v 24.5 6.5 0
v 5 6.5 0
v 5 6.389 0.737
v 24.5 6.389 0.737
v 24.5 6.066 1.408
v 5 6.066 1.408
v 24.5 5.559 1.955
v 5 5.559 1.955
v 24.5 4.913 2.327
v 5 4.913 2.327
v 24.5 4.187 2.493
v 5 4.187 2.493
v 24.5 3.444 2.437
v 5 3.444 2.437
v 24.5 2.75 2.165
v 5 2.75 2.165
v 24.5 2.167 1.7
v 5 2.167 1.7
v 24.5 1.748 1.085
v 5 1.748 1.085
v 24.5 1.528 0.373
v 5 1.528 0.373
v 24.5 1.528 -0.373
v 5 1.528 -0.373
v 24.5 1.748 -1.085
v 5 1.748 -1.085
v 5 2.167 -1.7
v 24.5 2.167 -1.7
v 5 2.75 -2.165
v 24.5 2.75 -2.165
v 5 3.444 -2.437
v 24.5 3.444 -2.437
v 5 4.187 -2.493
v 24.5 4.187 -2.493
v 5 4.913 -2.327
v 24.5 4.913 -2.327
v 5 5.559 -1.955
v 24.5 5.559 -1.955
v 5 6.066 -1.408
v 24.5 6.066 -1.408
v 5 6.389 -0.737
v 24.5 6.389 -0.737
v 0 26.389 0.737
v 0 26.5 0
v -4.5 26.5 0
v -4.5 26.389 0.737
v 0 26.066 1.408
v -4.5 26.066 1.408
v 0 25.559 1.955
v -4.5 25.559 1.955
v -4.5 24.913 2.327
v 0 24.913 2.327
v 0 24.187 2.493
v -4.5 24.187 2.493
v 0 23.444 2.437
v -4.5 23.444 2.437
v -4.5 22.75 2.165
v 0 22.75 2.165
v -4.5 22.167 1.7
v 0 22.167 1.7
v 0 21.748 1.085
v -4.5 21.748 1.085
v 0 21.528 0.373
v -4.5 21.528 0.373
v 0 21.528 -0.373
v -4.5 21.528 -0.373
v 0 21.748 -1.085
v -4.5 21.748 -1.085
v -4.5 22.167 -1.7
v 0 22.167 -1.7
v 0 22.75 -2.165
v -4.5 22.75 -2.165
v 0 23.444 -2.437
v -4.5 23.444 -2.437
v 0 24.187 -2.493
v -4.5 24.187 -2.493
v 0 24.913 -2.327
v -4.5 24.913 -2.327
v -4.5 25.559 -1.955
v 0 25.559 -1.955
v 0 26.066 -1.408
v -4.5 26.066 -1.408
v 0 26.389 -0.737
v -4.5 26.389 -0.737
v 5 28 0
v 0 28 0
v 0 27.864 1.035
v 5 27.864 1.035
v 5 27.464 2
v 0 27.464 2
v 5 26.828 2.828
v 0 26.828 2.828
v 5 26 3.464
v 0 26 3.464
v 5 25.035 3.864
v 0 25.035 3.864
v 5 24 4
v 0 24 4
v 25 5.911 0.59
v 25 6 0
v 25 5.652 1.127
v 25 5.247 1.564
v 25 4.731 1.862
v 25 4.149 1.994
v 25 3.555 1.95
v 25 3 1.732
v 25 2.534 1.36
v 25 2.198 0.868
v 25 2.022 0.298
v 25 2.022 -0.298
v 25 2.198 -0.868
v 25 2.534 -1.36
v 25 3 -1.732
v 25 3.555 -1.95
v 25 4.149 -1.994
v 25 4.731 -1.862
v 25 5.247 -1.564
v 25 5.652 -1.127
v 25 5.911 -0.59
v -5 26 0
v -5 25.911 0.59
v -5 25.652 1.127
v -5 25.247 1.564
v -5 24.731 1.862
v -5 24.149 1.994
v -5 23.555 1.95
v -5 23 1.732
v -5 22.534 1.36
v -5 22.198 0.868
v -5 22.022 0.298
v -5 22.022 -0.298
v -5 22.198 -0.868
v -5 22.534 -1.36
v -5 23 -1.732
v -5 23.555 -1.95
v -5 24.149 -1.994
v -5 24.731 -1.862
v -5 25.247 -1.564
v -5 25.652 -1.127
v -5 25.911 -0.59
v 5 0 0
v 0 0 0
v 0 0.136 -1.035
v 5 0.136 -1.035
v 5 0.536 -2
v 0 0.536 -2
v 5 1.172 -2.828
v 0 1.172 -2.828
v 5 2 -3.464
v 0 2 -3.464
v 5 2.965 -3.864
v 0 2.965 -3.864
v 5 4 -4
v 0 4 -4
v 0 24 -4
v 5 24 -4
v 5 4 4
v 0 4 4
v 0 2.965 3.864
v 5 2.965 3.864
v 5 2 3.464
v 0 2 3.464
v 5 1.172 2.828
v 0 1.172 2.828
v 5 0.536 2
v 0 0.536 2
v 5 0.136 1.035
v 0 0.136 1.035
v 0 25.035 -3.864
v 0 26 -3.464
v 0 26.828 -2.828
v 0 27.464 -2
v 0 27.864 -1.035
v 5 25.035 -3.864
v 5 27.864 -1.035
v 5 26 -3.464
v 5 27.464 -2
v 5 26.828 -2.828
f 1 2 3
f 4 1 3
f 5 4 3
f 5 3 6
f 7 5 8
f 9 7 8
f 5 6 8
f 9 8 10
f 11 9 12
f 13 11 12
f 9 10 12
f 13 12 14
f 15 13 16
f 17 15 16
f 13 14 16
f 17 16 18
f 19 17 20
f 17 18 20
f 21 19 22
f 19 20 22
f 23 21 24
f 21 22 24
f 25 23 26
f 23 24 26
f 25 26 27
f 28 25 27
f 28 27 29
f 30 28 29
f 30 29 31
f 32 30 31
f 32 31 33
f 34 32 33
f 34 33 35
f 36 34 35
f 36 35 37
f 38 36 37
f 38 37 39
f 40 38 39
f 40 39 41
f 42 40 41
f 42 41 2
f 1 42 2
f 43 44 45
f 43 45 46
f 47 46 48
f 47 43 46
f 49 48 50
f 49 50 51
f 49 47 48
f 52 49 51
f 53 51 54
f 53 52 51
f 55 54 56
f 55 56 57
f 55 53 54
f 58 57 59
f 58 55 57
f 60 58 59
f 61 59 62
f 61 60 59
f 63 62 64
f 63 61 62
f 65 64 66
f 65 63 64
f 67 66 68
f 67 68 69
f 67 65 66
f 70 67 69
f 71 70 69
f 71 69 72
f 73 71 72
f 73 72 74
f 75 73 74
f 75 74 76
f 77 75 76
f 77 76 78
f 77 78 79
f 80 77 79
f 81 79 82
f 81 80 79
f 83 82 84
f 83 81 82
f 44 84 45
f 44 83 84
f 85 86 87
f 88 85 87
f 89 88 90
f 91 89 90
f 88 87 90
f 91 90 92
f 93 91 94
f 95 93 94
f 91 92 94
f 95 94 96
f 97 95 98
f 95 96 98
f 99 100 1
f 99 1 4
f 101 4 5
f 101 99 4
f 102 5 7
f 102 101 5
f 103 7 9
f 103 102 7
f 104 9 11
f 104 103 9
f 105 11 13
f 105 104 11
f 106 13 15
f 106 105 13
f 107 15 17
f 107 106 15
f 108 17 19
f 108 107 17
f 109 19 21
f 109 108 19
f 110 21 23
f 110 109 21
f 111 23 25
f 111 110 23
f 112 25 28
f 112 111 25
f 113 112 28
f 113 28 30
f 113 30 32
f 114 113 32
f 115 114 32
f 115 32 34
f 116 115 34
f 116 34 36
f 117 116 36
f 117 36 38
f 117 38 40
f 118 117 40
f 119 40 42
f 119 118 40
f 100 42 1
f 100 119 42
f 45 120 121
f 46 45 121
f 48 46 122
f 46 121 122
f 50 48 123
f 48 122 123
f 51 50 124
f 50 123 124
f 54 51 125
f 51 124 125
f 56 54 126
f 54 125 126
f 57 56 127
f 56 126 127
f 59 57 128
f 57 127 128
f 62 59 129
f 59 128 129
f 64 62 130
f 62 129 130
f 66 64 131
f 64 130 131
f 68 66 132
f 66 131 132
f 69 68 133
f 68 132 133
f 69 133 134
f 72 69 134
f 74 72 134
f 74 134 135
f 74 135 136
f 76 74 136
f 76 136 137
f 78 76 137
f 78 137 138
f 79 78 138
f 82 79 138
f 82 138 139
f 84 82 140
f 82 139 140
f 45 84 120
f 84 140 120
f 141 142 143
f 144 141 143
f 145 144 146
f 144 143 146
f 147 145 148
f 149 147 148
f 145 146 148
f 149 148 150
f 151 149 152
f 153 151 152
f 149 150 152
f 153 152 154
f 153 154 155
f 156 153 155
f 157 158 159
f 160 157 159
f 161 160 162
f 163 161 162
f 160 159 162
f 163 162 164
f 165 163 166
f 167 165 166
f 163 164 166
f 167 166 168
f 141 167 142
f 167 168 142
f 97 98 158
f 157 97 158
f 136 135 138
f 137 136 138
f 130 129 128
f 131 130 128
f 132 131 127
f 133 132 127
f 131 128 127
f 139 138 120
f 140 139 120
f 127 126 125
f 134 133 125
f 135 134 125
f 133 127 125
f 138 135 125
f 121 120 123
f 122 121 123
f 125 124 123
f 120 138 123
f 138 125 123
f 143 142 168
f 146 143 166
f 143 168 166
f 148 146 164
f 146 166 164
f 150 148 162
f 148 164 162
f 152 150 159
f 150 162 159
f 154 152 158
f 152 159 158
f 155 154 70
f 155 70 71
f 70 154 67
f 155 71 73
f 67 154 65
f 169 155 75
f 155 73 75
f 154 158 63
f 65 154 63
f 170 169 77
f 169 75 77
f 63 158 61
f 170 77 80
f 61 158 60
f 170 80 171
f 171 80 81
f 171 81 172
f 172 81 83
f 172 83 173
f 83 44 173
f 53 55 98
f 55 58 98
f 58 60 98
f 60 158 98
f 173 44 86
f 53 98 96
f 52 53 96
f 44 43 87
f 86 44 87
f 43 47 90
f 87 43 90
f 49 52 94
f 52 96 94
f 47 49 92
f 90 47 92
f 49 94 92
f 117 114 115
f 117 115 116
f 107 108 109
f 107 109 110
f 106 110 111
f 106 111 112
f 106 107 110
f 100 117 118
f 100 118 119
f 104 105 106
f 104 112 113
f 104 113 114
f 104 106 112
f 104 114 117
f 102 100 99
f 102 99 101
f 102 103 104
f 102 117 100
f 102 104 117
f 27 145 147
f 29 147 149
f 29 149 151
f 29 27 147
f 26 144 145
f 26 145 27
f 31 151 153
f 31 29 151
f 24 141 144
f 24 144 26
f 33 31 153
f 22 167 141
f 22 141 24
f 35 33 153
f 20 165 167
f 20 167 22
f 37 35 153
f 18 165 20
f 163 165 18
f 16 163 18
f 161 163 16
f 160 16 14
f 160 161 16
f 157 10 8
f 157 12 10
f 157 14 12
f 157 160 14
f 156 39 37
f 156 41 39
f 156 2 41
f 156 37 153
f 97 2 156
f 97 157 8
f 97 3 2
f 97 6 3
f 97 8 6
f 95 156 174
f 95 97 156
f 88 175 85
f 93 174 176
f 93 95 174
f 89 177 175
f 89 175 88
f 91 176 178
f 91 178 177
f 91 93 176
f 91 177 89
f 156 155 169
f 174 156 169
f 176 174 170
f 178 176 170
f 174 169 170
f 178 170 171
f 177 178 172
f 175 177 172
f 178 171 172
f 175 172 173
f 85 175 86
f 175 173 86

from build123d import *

# Parameters (mm, degrees)
F0_R          = 2.5
F1_DEPTH      = 25
F2_DEPTH      = 5
F3_DEPTH      = 5
F3_DEPTH_BACK = 5
F4_SIZE       = 0.5


with BuildPart() as f1:
    # F0 (on Right) → F1 (new body)
    with BuildSketch(Plane.YZ):
        with Locations((4, 0)):
            Circle(F0_R)
    extrude(amount=F1_DEPTH)

    # F0 (on Right) → F2 (join)
    with BuildSketch(Plane.YZ):
        with BuildLine():
            ThreePointArc((0, 0), (1.1715728753, -2.8284271247), (4, -4))
            Line((4, -4), (24, -4))
            ThreePointArc((24, -4), (26.8284271247, -2.8284271247), (28, 0))
            ThreePointArc((28, 0), (26.8284271247, 2.8284271247), (24, 4))
            Line((24, 4), (4, 4))
            ThreePointArc((4, 4), (1.1715728753, 2.8284271247), (0, 0))
        make_face()
        with Locations((4, 0)):
            Circle(F0_R, mode=Mode.SUBTRACT)
        with Locations((24, 0)):
            Circle(F0_R, mode=Mode.SUBTRACT)
    extrude(amount=F2_DEPTH)

    # F0 (on Right) → F3 (join, two sides)
    with BuildSketch(Plane.YZ) as f3_sk:
        with Locations((24, 0)):
            Circle(F0_R)
    extrude(amount=-F3_DEPTH)
    extrude(f3_sk.sketch, amount=F3_DEPTH_BACK)

    # F4
    f4_edges = [f1.edges().sort_by_distance(p)[0] for p in [
        (-5, 21.5, 0),
        (25, 1.5, 0),
    ]]
    chamfer(f4_edges, length=F4_SIZE)


solid = f1.part
